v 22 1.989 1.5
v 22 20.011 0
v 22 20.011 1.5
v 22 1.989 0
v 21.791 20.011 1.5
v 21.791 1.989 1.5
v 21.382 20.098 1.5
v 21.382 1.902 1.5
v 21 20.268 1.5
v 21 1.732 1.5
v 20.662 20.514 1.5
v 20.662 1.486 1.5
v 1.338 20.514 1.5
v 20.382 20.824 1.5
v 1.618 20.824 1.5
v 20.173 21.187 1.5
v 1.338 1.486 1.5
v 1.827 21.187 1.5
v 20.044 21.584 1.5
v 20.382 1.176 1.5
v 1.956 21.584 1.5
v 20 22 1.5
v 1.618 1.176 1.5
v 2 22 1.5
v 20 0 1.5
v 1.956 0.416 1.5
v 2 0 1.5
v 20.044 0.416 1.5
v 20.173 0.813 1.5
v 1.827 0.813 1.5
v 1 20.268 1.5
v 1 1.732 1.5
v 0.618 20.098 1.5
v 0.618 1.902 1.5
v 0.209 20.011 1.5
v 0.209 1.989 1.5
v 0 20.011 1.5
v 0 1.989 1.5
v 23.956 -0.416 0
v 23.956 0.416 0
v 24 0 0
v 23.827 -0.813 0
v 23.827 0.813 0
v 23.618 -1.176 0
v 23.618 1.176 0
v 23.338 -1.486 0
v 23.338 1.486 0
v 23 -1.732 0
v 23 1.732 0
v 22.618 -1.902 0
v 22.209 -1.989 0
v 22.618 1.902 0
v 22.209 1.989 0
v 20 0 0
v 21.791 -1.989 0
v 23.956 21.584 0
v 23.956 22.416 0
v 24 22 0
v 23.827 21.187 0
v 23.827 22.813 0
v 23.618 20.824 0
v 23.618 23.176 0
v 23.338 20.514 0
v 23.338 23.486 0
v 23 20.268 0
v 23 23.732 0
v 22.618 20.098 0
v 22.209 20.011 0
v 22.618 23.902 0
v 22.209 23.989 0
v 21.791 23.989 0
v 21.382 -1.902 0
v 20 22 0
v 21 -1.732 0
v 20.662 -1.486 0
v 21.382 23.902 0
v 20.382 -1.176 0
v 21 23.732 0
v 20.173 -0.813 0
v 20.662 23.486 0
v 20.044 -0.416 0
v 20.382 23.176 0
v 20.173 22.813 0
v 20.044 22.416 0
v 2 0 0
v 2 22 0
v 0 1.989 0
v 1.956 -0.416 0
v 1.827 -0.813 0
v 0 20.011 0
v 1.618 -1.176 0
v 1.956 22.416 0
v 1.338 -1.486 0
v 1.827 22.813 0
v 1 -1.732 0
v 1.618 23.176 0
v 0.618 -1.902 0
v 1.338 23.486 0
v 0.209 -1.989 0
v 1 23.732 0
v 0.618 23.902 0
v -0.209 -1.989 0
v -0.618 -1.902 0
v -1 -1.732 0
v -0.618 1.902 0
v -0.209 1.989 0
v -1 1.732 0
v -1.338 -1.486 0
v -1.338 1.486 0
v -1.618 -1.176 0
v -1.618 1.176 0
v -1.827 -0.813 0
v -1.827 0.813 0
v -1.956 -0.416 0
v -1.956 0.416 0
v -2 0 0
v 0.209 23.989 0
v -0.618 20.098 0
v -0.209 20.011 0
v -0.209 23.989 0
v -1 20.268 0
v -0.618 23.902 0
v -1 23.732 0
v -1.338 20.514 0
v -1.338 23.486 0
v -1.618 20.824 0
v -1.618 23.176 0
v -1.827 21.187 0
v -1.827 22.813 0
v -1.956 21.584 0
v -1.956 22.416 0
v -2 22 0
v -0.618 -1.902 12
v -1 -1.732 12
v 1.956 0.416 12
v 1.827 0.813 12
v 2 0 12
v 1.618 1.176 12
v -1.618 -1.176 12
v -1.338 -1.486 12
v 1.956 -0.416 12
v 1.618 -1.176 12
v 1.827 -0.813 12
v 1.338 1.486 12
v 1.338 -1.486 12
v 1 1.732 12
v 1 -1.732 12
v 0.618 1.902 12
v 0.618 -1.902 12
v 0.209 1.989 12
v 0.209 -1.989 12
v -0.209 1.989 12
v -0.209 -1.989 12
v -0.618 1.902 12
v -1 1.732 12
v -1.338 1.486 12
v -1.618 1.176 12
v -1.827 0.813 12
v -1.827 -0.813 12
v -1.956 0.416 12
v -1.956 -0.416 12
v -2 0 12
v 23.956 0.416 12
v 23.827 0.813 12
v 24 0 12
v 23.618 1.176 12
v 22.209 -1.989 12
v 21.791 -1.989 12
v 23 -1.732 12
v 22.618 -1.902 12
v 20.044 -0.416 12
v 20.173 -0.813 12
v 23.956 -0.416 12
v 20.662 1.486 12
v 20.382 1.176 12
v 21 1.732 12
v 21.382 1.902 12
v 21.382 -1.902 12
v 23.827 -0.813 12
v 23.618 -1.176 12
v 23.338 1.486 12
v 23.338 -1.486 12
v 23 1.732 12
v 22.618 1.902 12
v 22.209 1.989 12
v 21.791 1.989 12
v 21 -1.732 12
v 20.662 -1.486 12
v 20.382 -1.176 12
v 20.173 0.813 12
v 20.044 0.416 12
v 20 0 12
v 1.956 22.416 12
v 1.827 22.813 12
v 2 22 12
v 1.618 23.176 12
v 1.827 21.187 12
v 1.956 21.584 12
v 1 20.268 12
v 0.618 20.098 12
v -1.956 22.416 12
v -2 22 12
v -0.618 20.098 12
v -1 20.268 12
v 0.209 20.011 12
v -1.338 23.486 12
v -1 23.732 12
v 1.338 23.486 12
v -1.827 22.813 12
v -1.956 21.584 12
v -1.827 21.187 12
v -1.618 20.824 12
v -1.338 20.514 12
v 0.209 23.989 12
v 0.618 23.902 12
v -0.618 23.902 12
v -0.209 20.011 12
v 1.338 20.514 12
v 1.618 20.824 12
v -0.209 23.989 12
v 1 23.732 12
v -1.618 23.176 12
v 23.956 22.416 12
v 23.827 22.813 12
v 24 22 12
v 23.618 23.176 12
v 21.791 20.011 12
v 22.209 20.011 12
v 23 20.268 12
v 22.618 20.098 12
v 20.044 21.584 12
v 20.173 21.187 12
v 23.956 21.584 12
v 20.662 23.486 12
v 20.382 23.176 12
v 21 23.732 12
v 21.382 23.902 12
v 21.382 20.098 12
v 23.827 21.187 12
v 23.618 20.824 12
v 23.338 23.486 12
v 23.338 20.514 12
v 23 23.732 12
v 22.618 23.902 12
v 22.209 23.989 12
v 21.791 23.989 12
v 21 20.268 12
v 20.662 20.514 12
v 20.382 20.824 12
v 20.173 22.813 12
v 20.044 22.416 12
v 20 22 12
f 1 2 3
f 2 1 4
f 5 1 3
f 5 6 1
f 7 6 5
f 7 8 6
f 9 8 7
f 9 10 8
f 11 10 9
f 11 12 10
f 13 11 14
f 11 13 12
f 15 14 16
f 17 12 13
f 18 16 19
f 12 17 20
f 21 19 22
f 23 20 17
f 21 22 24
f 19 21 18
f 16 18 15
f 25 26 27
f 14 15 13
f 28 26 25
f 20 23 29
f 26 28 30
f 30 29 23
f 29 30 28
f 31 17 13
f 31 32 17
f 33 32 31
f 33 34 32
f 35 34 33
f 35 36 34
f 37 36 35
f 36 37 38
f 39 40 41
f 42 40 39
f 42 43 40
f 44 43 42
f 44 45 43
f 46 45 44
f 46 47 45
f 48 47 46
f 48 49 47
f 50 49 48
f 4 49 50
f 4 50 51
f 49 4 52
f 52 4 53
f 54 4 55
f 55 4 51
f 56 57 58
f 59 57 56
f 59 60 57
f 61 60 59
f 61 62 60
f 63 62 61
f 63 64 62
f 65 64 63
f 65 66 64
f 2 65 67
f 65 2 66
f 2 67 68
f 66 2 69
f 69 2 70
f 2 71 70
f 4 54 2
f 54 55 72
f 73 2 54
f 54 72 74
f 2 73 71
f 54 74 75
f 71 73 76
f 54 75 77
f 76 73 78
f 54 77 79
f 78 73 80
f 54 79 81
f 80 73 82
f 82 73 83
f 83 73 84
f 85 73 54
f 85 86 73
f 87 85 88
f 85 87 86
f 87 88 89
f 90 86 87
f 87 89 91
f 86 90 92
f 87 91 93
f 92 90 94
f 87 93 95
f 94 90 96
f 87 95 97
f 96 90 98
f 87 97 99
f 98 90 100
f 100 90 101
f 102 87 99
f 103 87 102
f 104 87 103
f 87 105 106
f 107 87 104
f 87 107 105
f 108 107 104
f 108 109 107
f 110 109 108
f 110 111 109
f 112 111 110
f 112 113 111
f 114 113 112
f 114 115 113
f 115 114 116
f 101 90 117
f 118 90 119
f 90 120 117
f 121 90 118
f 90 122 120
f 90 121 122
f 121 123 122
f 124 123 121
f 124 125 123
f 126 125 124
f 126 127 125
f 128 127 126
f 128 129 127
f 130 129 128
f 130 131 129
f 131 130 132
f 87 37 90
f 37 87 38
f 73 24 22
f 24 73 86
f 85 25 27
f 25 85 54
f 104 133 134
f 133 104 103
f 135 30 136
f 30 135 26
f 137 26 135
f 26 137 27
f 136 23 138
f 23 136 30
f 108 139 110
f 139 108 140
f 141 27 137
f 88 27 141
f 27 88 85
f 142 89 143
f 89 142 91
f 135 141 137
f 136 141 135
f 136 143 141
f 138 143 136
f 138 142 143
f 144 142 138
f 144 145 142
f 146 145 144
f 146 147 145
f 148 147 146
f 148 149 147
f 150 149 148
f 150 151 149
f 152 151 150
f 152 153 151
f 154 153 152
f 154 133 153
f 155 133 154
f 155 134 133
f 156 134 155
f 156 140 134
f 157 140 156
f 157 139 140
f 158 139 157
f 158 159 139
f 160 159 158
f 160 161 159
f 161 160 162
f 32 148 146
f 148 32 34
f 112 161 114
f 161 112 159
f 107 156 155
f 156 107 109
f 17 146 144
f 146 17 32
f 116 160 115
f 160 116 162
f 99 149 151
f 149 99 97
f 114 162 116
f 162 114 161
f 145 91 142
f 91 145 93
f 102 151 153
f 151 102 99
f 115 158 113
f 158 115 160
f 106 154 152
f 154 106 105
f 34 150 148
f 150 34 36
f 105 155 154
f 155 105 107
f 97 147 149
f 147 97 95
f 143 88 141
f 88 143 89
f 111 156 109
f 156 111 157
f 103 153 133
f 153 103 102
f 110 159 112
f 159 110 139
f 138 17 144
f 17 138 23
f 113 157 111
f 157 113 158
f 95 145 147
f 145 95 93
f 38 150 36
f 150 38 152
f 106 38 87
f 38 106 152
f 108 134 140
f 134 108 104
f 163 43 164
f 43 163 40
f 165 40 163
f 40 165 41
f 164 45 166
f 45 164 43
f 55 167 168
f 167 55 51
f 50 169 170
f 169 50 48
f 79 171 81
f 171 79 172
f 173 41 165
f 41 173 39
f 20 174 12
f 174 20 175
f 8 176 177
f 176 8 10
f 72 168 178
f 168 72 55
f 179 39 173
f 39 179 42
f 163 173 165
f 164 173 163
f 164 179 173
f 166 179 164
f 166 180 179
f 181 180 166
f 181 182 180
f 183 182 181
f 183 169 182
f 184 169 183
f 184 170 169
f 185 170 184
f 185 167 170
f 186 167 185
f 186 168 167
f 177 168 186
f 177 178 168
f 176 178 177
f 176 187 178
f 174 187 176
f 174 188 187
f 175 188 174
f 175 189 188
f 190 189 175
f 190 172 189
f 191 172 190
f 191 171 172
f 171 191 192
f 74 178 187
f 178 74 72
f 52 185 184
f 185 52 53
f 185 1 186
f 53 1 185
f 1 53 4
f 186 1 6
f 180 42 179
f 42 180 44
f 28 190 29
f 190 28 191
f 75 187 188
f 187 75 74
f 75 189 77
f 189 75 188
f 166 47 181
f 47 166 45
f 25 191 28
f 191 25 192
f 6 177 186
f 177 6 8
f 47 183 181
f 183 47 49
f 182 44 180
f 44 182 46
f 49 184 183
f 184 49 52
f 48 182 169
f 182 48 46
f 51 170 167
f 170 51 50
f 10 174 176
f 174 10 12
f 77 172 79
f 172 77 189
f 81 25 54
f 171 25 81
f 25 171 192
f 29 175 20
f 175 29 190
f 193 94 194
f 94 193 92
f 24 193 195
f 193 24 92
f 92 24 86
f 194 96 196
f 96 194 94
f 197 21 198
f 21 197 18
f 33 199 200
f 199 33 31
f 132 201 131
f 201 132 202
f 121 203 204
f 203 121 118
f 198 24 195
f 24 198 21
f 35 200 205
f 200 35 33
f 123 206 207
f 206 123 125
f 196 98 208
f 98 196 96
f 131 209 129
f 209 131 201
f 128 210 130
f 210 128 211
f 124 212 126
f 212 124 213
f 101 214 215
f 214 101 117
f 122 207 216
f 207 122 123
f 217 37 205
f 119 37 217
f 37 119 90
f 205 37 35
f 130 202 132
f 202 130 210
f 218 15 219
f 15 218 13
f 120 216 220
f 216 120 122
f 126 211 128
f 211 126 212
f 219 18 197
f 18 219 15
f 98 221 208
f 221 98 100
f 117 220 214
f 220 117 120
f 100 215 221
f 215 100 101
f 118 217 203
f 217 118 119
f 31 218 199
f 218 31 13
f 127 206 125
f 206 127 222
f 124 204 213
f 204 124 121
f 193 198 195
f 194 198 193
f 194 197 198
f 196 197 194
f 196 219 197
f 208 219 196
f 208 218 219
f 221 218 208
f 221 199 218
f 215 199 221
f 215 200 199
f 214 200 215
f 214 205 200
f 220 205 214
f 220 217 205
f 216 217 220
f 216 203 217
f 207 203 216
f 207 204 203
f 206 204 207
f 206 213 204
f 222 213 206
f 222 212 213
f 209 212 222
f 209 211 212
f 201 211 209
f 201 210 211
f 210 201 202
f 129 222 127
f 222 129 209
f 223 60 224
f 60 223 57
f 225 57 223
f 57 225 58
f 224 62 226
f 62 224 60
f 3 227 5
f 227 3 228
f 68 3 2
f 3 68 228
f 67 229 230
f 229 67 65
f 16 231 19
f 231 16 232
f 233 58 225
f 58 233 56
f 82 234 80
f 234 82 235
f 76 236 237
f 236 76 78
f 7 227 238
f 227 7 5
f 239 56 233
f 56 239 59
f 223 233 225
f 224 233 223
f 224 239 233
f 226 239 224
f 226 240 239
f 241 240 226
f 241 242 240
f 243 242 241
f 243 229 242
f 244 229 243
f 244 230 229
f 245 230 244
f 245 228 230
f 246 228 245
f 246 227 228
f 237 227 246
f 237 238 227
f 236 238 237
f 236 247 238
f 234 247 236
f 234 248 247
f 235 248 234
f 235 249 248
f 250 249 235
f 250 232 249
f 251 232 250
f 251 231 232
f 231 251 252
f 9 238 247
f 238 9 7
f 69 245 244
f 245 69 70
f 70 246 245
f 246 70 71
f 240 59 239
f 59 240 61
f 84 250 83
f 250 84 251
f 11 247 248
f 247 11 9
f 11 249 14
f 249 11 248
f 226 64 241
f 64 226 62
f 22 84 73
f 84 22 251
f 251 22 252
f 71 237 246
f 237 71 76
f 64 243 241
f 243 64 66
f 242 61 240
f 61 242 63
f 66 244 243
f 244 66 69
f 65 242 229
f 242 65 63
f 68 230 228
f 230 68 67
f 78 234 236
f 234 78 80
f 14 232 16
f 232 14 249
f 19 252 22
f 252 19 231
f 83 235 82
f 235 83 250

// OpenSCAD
$fn = 30;

cube([22, 22, 1.5]);


cylinder(r = 2, h = 12);
translate([22,0,0]) cylinder(r = 2, h = 12);
translate([0,22,0]) cylinder(r = 2, h = 12);
translate([22,22,0]) cylinder(r = 2, h = 12);
